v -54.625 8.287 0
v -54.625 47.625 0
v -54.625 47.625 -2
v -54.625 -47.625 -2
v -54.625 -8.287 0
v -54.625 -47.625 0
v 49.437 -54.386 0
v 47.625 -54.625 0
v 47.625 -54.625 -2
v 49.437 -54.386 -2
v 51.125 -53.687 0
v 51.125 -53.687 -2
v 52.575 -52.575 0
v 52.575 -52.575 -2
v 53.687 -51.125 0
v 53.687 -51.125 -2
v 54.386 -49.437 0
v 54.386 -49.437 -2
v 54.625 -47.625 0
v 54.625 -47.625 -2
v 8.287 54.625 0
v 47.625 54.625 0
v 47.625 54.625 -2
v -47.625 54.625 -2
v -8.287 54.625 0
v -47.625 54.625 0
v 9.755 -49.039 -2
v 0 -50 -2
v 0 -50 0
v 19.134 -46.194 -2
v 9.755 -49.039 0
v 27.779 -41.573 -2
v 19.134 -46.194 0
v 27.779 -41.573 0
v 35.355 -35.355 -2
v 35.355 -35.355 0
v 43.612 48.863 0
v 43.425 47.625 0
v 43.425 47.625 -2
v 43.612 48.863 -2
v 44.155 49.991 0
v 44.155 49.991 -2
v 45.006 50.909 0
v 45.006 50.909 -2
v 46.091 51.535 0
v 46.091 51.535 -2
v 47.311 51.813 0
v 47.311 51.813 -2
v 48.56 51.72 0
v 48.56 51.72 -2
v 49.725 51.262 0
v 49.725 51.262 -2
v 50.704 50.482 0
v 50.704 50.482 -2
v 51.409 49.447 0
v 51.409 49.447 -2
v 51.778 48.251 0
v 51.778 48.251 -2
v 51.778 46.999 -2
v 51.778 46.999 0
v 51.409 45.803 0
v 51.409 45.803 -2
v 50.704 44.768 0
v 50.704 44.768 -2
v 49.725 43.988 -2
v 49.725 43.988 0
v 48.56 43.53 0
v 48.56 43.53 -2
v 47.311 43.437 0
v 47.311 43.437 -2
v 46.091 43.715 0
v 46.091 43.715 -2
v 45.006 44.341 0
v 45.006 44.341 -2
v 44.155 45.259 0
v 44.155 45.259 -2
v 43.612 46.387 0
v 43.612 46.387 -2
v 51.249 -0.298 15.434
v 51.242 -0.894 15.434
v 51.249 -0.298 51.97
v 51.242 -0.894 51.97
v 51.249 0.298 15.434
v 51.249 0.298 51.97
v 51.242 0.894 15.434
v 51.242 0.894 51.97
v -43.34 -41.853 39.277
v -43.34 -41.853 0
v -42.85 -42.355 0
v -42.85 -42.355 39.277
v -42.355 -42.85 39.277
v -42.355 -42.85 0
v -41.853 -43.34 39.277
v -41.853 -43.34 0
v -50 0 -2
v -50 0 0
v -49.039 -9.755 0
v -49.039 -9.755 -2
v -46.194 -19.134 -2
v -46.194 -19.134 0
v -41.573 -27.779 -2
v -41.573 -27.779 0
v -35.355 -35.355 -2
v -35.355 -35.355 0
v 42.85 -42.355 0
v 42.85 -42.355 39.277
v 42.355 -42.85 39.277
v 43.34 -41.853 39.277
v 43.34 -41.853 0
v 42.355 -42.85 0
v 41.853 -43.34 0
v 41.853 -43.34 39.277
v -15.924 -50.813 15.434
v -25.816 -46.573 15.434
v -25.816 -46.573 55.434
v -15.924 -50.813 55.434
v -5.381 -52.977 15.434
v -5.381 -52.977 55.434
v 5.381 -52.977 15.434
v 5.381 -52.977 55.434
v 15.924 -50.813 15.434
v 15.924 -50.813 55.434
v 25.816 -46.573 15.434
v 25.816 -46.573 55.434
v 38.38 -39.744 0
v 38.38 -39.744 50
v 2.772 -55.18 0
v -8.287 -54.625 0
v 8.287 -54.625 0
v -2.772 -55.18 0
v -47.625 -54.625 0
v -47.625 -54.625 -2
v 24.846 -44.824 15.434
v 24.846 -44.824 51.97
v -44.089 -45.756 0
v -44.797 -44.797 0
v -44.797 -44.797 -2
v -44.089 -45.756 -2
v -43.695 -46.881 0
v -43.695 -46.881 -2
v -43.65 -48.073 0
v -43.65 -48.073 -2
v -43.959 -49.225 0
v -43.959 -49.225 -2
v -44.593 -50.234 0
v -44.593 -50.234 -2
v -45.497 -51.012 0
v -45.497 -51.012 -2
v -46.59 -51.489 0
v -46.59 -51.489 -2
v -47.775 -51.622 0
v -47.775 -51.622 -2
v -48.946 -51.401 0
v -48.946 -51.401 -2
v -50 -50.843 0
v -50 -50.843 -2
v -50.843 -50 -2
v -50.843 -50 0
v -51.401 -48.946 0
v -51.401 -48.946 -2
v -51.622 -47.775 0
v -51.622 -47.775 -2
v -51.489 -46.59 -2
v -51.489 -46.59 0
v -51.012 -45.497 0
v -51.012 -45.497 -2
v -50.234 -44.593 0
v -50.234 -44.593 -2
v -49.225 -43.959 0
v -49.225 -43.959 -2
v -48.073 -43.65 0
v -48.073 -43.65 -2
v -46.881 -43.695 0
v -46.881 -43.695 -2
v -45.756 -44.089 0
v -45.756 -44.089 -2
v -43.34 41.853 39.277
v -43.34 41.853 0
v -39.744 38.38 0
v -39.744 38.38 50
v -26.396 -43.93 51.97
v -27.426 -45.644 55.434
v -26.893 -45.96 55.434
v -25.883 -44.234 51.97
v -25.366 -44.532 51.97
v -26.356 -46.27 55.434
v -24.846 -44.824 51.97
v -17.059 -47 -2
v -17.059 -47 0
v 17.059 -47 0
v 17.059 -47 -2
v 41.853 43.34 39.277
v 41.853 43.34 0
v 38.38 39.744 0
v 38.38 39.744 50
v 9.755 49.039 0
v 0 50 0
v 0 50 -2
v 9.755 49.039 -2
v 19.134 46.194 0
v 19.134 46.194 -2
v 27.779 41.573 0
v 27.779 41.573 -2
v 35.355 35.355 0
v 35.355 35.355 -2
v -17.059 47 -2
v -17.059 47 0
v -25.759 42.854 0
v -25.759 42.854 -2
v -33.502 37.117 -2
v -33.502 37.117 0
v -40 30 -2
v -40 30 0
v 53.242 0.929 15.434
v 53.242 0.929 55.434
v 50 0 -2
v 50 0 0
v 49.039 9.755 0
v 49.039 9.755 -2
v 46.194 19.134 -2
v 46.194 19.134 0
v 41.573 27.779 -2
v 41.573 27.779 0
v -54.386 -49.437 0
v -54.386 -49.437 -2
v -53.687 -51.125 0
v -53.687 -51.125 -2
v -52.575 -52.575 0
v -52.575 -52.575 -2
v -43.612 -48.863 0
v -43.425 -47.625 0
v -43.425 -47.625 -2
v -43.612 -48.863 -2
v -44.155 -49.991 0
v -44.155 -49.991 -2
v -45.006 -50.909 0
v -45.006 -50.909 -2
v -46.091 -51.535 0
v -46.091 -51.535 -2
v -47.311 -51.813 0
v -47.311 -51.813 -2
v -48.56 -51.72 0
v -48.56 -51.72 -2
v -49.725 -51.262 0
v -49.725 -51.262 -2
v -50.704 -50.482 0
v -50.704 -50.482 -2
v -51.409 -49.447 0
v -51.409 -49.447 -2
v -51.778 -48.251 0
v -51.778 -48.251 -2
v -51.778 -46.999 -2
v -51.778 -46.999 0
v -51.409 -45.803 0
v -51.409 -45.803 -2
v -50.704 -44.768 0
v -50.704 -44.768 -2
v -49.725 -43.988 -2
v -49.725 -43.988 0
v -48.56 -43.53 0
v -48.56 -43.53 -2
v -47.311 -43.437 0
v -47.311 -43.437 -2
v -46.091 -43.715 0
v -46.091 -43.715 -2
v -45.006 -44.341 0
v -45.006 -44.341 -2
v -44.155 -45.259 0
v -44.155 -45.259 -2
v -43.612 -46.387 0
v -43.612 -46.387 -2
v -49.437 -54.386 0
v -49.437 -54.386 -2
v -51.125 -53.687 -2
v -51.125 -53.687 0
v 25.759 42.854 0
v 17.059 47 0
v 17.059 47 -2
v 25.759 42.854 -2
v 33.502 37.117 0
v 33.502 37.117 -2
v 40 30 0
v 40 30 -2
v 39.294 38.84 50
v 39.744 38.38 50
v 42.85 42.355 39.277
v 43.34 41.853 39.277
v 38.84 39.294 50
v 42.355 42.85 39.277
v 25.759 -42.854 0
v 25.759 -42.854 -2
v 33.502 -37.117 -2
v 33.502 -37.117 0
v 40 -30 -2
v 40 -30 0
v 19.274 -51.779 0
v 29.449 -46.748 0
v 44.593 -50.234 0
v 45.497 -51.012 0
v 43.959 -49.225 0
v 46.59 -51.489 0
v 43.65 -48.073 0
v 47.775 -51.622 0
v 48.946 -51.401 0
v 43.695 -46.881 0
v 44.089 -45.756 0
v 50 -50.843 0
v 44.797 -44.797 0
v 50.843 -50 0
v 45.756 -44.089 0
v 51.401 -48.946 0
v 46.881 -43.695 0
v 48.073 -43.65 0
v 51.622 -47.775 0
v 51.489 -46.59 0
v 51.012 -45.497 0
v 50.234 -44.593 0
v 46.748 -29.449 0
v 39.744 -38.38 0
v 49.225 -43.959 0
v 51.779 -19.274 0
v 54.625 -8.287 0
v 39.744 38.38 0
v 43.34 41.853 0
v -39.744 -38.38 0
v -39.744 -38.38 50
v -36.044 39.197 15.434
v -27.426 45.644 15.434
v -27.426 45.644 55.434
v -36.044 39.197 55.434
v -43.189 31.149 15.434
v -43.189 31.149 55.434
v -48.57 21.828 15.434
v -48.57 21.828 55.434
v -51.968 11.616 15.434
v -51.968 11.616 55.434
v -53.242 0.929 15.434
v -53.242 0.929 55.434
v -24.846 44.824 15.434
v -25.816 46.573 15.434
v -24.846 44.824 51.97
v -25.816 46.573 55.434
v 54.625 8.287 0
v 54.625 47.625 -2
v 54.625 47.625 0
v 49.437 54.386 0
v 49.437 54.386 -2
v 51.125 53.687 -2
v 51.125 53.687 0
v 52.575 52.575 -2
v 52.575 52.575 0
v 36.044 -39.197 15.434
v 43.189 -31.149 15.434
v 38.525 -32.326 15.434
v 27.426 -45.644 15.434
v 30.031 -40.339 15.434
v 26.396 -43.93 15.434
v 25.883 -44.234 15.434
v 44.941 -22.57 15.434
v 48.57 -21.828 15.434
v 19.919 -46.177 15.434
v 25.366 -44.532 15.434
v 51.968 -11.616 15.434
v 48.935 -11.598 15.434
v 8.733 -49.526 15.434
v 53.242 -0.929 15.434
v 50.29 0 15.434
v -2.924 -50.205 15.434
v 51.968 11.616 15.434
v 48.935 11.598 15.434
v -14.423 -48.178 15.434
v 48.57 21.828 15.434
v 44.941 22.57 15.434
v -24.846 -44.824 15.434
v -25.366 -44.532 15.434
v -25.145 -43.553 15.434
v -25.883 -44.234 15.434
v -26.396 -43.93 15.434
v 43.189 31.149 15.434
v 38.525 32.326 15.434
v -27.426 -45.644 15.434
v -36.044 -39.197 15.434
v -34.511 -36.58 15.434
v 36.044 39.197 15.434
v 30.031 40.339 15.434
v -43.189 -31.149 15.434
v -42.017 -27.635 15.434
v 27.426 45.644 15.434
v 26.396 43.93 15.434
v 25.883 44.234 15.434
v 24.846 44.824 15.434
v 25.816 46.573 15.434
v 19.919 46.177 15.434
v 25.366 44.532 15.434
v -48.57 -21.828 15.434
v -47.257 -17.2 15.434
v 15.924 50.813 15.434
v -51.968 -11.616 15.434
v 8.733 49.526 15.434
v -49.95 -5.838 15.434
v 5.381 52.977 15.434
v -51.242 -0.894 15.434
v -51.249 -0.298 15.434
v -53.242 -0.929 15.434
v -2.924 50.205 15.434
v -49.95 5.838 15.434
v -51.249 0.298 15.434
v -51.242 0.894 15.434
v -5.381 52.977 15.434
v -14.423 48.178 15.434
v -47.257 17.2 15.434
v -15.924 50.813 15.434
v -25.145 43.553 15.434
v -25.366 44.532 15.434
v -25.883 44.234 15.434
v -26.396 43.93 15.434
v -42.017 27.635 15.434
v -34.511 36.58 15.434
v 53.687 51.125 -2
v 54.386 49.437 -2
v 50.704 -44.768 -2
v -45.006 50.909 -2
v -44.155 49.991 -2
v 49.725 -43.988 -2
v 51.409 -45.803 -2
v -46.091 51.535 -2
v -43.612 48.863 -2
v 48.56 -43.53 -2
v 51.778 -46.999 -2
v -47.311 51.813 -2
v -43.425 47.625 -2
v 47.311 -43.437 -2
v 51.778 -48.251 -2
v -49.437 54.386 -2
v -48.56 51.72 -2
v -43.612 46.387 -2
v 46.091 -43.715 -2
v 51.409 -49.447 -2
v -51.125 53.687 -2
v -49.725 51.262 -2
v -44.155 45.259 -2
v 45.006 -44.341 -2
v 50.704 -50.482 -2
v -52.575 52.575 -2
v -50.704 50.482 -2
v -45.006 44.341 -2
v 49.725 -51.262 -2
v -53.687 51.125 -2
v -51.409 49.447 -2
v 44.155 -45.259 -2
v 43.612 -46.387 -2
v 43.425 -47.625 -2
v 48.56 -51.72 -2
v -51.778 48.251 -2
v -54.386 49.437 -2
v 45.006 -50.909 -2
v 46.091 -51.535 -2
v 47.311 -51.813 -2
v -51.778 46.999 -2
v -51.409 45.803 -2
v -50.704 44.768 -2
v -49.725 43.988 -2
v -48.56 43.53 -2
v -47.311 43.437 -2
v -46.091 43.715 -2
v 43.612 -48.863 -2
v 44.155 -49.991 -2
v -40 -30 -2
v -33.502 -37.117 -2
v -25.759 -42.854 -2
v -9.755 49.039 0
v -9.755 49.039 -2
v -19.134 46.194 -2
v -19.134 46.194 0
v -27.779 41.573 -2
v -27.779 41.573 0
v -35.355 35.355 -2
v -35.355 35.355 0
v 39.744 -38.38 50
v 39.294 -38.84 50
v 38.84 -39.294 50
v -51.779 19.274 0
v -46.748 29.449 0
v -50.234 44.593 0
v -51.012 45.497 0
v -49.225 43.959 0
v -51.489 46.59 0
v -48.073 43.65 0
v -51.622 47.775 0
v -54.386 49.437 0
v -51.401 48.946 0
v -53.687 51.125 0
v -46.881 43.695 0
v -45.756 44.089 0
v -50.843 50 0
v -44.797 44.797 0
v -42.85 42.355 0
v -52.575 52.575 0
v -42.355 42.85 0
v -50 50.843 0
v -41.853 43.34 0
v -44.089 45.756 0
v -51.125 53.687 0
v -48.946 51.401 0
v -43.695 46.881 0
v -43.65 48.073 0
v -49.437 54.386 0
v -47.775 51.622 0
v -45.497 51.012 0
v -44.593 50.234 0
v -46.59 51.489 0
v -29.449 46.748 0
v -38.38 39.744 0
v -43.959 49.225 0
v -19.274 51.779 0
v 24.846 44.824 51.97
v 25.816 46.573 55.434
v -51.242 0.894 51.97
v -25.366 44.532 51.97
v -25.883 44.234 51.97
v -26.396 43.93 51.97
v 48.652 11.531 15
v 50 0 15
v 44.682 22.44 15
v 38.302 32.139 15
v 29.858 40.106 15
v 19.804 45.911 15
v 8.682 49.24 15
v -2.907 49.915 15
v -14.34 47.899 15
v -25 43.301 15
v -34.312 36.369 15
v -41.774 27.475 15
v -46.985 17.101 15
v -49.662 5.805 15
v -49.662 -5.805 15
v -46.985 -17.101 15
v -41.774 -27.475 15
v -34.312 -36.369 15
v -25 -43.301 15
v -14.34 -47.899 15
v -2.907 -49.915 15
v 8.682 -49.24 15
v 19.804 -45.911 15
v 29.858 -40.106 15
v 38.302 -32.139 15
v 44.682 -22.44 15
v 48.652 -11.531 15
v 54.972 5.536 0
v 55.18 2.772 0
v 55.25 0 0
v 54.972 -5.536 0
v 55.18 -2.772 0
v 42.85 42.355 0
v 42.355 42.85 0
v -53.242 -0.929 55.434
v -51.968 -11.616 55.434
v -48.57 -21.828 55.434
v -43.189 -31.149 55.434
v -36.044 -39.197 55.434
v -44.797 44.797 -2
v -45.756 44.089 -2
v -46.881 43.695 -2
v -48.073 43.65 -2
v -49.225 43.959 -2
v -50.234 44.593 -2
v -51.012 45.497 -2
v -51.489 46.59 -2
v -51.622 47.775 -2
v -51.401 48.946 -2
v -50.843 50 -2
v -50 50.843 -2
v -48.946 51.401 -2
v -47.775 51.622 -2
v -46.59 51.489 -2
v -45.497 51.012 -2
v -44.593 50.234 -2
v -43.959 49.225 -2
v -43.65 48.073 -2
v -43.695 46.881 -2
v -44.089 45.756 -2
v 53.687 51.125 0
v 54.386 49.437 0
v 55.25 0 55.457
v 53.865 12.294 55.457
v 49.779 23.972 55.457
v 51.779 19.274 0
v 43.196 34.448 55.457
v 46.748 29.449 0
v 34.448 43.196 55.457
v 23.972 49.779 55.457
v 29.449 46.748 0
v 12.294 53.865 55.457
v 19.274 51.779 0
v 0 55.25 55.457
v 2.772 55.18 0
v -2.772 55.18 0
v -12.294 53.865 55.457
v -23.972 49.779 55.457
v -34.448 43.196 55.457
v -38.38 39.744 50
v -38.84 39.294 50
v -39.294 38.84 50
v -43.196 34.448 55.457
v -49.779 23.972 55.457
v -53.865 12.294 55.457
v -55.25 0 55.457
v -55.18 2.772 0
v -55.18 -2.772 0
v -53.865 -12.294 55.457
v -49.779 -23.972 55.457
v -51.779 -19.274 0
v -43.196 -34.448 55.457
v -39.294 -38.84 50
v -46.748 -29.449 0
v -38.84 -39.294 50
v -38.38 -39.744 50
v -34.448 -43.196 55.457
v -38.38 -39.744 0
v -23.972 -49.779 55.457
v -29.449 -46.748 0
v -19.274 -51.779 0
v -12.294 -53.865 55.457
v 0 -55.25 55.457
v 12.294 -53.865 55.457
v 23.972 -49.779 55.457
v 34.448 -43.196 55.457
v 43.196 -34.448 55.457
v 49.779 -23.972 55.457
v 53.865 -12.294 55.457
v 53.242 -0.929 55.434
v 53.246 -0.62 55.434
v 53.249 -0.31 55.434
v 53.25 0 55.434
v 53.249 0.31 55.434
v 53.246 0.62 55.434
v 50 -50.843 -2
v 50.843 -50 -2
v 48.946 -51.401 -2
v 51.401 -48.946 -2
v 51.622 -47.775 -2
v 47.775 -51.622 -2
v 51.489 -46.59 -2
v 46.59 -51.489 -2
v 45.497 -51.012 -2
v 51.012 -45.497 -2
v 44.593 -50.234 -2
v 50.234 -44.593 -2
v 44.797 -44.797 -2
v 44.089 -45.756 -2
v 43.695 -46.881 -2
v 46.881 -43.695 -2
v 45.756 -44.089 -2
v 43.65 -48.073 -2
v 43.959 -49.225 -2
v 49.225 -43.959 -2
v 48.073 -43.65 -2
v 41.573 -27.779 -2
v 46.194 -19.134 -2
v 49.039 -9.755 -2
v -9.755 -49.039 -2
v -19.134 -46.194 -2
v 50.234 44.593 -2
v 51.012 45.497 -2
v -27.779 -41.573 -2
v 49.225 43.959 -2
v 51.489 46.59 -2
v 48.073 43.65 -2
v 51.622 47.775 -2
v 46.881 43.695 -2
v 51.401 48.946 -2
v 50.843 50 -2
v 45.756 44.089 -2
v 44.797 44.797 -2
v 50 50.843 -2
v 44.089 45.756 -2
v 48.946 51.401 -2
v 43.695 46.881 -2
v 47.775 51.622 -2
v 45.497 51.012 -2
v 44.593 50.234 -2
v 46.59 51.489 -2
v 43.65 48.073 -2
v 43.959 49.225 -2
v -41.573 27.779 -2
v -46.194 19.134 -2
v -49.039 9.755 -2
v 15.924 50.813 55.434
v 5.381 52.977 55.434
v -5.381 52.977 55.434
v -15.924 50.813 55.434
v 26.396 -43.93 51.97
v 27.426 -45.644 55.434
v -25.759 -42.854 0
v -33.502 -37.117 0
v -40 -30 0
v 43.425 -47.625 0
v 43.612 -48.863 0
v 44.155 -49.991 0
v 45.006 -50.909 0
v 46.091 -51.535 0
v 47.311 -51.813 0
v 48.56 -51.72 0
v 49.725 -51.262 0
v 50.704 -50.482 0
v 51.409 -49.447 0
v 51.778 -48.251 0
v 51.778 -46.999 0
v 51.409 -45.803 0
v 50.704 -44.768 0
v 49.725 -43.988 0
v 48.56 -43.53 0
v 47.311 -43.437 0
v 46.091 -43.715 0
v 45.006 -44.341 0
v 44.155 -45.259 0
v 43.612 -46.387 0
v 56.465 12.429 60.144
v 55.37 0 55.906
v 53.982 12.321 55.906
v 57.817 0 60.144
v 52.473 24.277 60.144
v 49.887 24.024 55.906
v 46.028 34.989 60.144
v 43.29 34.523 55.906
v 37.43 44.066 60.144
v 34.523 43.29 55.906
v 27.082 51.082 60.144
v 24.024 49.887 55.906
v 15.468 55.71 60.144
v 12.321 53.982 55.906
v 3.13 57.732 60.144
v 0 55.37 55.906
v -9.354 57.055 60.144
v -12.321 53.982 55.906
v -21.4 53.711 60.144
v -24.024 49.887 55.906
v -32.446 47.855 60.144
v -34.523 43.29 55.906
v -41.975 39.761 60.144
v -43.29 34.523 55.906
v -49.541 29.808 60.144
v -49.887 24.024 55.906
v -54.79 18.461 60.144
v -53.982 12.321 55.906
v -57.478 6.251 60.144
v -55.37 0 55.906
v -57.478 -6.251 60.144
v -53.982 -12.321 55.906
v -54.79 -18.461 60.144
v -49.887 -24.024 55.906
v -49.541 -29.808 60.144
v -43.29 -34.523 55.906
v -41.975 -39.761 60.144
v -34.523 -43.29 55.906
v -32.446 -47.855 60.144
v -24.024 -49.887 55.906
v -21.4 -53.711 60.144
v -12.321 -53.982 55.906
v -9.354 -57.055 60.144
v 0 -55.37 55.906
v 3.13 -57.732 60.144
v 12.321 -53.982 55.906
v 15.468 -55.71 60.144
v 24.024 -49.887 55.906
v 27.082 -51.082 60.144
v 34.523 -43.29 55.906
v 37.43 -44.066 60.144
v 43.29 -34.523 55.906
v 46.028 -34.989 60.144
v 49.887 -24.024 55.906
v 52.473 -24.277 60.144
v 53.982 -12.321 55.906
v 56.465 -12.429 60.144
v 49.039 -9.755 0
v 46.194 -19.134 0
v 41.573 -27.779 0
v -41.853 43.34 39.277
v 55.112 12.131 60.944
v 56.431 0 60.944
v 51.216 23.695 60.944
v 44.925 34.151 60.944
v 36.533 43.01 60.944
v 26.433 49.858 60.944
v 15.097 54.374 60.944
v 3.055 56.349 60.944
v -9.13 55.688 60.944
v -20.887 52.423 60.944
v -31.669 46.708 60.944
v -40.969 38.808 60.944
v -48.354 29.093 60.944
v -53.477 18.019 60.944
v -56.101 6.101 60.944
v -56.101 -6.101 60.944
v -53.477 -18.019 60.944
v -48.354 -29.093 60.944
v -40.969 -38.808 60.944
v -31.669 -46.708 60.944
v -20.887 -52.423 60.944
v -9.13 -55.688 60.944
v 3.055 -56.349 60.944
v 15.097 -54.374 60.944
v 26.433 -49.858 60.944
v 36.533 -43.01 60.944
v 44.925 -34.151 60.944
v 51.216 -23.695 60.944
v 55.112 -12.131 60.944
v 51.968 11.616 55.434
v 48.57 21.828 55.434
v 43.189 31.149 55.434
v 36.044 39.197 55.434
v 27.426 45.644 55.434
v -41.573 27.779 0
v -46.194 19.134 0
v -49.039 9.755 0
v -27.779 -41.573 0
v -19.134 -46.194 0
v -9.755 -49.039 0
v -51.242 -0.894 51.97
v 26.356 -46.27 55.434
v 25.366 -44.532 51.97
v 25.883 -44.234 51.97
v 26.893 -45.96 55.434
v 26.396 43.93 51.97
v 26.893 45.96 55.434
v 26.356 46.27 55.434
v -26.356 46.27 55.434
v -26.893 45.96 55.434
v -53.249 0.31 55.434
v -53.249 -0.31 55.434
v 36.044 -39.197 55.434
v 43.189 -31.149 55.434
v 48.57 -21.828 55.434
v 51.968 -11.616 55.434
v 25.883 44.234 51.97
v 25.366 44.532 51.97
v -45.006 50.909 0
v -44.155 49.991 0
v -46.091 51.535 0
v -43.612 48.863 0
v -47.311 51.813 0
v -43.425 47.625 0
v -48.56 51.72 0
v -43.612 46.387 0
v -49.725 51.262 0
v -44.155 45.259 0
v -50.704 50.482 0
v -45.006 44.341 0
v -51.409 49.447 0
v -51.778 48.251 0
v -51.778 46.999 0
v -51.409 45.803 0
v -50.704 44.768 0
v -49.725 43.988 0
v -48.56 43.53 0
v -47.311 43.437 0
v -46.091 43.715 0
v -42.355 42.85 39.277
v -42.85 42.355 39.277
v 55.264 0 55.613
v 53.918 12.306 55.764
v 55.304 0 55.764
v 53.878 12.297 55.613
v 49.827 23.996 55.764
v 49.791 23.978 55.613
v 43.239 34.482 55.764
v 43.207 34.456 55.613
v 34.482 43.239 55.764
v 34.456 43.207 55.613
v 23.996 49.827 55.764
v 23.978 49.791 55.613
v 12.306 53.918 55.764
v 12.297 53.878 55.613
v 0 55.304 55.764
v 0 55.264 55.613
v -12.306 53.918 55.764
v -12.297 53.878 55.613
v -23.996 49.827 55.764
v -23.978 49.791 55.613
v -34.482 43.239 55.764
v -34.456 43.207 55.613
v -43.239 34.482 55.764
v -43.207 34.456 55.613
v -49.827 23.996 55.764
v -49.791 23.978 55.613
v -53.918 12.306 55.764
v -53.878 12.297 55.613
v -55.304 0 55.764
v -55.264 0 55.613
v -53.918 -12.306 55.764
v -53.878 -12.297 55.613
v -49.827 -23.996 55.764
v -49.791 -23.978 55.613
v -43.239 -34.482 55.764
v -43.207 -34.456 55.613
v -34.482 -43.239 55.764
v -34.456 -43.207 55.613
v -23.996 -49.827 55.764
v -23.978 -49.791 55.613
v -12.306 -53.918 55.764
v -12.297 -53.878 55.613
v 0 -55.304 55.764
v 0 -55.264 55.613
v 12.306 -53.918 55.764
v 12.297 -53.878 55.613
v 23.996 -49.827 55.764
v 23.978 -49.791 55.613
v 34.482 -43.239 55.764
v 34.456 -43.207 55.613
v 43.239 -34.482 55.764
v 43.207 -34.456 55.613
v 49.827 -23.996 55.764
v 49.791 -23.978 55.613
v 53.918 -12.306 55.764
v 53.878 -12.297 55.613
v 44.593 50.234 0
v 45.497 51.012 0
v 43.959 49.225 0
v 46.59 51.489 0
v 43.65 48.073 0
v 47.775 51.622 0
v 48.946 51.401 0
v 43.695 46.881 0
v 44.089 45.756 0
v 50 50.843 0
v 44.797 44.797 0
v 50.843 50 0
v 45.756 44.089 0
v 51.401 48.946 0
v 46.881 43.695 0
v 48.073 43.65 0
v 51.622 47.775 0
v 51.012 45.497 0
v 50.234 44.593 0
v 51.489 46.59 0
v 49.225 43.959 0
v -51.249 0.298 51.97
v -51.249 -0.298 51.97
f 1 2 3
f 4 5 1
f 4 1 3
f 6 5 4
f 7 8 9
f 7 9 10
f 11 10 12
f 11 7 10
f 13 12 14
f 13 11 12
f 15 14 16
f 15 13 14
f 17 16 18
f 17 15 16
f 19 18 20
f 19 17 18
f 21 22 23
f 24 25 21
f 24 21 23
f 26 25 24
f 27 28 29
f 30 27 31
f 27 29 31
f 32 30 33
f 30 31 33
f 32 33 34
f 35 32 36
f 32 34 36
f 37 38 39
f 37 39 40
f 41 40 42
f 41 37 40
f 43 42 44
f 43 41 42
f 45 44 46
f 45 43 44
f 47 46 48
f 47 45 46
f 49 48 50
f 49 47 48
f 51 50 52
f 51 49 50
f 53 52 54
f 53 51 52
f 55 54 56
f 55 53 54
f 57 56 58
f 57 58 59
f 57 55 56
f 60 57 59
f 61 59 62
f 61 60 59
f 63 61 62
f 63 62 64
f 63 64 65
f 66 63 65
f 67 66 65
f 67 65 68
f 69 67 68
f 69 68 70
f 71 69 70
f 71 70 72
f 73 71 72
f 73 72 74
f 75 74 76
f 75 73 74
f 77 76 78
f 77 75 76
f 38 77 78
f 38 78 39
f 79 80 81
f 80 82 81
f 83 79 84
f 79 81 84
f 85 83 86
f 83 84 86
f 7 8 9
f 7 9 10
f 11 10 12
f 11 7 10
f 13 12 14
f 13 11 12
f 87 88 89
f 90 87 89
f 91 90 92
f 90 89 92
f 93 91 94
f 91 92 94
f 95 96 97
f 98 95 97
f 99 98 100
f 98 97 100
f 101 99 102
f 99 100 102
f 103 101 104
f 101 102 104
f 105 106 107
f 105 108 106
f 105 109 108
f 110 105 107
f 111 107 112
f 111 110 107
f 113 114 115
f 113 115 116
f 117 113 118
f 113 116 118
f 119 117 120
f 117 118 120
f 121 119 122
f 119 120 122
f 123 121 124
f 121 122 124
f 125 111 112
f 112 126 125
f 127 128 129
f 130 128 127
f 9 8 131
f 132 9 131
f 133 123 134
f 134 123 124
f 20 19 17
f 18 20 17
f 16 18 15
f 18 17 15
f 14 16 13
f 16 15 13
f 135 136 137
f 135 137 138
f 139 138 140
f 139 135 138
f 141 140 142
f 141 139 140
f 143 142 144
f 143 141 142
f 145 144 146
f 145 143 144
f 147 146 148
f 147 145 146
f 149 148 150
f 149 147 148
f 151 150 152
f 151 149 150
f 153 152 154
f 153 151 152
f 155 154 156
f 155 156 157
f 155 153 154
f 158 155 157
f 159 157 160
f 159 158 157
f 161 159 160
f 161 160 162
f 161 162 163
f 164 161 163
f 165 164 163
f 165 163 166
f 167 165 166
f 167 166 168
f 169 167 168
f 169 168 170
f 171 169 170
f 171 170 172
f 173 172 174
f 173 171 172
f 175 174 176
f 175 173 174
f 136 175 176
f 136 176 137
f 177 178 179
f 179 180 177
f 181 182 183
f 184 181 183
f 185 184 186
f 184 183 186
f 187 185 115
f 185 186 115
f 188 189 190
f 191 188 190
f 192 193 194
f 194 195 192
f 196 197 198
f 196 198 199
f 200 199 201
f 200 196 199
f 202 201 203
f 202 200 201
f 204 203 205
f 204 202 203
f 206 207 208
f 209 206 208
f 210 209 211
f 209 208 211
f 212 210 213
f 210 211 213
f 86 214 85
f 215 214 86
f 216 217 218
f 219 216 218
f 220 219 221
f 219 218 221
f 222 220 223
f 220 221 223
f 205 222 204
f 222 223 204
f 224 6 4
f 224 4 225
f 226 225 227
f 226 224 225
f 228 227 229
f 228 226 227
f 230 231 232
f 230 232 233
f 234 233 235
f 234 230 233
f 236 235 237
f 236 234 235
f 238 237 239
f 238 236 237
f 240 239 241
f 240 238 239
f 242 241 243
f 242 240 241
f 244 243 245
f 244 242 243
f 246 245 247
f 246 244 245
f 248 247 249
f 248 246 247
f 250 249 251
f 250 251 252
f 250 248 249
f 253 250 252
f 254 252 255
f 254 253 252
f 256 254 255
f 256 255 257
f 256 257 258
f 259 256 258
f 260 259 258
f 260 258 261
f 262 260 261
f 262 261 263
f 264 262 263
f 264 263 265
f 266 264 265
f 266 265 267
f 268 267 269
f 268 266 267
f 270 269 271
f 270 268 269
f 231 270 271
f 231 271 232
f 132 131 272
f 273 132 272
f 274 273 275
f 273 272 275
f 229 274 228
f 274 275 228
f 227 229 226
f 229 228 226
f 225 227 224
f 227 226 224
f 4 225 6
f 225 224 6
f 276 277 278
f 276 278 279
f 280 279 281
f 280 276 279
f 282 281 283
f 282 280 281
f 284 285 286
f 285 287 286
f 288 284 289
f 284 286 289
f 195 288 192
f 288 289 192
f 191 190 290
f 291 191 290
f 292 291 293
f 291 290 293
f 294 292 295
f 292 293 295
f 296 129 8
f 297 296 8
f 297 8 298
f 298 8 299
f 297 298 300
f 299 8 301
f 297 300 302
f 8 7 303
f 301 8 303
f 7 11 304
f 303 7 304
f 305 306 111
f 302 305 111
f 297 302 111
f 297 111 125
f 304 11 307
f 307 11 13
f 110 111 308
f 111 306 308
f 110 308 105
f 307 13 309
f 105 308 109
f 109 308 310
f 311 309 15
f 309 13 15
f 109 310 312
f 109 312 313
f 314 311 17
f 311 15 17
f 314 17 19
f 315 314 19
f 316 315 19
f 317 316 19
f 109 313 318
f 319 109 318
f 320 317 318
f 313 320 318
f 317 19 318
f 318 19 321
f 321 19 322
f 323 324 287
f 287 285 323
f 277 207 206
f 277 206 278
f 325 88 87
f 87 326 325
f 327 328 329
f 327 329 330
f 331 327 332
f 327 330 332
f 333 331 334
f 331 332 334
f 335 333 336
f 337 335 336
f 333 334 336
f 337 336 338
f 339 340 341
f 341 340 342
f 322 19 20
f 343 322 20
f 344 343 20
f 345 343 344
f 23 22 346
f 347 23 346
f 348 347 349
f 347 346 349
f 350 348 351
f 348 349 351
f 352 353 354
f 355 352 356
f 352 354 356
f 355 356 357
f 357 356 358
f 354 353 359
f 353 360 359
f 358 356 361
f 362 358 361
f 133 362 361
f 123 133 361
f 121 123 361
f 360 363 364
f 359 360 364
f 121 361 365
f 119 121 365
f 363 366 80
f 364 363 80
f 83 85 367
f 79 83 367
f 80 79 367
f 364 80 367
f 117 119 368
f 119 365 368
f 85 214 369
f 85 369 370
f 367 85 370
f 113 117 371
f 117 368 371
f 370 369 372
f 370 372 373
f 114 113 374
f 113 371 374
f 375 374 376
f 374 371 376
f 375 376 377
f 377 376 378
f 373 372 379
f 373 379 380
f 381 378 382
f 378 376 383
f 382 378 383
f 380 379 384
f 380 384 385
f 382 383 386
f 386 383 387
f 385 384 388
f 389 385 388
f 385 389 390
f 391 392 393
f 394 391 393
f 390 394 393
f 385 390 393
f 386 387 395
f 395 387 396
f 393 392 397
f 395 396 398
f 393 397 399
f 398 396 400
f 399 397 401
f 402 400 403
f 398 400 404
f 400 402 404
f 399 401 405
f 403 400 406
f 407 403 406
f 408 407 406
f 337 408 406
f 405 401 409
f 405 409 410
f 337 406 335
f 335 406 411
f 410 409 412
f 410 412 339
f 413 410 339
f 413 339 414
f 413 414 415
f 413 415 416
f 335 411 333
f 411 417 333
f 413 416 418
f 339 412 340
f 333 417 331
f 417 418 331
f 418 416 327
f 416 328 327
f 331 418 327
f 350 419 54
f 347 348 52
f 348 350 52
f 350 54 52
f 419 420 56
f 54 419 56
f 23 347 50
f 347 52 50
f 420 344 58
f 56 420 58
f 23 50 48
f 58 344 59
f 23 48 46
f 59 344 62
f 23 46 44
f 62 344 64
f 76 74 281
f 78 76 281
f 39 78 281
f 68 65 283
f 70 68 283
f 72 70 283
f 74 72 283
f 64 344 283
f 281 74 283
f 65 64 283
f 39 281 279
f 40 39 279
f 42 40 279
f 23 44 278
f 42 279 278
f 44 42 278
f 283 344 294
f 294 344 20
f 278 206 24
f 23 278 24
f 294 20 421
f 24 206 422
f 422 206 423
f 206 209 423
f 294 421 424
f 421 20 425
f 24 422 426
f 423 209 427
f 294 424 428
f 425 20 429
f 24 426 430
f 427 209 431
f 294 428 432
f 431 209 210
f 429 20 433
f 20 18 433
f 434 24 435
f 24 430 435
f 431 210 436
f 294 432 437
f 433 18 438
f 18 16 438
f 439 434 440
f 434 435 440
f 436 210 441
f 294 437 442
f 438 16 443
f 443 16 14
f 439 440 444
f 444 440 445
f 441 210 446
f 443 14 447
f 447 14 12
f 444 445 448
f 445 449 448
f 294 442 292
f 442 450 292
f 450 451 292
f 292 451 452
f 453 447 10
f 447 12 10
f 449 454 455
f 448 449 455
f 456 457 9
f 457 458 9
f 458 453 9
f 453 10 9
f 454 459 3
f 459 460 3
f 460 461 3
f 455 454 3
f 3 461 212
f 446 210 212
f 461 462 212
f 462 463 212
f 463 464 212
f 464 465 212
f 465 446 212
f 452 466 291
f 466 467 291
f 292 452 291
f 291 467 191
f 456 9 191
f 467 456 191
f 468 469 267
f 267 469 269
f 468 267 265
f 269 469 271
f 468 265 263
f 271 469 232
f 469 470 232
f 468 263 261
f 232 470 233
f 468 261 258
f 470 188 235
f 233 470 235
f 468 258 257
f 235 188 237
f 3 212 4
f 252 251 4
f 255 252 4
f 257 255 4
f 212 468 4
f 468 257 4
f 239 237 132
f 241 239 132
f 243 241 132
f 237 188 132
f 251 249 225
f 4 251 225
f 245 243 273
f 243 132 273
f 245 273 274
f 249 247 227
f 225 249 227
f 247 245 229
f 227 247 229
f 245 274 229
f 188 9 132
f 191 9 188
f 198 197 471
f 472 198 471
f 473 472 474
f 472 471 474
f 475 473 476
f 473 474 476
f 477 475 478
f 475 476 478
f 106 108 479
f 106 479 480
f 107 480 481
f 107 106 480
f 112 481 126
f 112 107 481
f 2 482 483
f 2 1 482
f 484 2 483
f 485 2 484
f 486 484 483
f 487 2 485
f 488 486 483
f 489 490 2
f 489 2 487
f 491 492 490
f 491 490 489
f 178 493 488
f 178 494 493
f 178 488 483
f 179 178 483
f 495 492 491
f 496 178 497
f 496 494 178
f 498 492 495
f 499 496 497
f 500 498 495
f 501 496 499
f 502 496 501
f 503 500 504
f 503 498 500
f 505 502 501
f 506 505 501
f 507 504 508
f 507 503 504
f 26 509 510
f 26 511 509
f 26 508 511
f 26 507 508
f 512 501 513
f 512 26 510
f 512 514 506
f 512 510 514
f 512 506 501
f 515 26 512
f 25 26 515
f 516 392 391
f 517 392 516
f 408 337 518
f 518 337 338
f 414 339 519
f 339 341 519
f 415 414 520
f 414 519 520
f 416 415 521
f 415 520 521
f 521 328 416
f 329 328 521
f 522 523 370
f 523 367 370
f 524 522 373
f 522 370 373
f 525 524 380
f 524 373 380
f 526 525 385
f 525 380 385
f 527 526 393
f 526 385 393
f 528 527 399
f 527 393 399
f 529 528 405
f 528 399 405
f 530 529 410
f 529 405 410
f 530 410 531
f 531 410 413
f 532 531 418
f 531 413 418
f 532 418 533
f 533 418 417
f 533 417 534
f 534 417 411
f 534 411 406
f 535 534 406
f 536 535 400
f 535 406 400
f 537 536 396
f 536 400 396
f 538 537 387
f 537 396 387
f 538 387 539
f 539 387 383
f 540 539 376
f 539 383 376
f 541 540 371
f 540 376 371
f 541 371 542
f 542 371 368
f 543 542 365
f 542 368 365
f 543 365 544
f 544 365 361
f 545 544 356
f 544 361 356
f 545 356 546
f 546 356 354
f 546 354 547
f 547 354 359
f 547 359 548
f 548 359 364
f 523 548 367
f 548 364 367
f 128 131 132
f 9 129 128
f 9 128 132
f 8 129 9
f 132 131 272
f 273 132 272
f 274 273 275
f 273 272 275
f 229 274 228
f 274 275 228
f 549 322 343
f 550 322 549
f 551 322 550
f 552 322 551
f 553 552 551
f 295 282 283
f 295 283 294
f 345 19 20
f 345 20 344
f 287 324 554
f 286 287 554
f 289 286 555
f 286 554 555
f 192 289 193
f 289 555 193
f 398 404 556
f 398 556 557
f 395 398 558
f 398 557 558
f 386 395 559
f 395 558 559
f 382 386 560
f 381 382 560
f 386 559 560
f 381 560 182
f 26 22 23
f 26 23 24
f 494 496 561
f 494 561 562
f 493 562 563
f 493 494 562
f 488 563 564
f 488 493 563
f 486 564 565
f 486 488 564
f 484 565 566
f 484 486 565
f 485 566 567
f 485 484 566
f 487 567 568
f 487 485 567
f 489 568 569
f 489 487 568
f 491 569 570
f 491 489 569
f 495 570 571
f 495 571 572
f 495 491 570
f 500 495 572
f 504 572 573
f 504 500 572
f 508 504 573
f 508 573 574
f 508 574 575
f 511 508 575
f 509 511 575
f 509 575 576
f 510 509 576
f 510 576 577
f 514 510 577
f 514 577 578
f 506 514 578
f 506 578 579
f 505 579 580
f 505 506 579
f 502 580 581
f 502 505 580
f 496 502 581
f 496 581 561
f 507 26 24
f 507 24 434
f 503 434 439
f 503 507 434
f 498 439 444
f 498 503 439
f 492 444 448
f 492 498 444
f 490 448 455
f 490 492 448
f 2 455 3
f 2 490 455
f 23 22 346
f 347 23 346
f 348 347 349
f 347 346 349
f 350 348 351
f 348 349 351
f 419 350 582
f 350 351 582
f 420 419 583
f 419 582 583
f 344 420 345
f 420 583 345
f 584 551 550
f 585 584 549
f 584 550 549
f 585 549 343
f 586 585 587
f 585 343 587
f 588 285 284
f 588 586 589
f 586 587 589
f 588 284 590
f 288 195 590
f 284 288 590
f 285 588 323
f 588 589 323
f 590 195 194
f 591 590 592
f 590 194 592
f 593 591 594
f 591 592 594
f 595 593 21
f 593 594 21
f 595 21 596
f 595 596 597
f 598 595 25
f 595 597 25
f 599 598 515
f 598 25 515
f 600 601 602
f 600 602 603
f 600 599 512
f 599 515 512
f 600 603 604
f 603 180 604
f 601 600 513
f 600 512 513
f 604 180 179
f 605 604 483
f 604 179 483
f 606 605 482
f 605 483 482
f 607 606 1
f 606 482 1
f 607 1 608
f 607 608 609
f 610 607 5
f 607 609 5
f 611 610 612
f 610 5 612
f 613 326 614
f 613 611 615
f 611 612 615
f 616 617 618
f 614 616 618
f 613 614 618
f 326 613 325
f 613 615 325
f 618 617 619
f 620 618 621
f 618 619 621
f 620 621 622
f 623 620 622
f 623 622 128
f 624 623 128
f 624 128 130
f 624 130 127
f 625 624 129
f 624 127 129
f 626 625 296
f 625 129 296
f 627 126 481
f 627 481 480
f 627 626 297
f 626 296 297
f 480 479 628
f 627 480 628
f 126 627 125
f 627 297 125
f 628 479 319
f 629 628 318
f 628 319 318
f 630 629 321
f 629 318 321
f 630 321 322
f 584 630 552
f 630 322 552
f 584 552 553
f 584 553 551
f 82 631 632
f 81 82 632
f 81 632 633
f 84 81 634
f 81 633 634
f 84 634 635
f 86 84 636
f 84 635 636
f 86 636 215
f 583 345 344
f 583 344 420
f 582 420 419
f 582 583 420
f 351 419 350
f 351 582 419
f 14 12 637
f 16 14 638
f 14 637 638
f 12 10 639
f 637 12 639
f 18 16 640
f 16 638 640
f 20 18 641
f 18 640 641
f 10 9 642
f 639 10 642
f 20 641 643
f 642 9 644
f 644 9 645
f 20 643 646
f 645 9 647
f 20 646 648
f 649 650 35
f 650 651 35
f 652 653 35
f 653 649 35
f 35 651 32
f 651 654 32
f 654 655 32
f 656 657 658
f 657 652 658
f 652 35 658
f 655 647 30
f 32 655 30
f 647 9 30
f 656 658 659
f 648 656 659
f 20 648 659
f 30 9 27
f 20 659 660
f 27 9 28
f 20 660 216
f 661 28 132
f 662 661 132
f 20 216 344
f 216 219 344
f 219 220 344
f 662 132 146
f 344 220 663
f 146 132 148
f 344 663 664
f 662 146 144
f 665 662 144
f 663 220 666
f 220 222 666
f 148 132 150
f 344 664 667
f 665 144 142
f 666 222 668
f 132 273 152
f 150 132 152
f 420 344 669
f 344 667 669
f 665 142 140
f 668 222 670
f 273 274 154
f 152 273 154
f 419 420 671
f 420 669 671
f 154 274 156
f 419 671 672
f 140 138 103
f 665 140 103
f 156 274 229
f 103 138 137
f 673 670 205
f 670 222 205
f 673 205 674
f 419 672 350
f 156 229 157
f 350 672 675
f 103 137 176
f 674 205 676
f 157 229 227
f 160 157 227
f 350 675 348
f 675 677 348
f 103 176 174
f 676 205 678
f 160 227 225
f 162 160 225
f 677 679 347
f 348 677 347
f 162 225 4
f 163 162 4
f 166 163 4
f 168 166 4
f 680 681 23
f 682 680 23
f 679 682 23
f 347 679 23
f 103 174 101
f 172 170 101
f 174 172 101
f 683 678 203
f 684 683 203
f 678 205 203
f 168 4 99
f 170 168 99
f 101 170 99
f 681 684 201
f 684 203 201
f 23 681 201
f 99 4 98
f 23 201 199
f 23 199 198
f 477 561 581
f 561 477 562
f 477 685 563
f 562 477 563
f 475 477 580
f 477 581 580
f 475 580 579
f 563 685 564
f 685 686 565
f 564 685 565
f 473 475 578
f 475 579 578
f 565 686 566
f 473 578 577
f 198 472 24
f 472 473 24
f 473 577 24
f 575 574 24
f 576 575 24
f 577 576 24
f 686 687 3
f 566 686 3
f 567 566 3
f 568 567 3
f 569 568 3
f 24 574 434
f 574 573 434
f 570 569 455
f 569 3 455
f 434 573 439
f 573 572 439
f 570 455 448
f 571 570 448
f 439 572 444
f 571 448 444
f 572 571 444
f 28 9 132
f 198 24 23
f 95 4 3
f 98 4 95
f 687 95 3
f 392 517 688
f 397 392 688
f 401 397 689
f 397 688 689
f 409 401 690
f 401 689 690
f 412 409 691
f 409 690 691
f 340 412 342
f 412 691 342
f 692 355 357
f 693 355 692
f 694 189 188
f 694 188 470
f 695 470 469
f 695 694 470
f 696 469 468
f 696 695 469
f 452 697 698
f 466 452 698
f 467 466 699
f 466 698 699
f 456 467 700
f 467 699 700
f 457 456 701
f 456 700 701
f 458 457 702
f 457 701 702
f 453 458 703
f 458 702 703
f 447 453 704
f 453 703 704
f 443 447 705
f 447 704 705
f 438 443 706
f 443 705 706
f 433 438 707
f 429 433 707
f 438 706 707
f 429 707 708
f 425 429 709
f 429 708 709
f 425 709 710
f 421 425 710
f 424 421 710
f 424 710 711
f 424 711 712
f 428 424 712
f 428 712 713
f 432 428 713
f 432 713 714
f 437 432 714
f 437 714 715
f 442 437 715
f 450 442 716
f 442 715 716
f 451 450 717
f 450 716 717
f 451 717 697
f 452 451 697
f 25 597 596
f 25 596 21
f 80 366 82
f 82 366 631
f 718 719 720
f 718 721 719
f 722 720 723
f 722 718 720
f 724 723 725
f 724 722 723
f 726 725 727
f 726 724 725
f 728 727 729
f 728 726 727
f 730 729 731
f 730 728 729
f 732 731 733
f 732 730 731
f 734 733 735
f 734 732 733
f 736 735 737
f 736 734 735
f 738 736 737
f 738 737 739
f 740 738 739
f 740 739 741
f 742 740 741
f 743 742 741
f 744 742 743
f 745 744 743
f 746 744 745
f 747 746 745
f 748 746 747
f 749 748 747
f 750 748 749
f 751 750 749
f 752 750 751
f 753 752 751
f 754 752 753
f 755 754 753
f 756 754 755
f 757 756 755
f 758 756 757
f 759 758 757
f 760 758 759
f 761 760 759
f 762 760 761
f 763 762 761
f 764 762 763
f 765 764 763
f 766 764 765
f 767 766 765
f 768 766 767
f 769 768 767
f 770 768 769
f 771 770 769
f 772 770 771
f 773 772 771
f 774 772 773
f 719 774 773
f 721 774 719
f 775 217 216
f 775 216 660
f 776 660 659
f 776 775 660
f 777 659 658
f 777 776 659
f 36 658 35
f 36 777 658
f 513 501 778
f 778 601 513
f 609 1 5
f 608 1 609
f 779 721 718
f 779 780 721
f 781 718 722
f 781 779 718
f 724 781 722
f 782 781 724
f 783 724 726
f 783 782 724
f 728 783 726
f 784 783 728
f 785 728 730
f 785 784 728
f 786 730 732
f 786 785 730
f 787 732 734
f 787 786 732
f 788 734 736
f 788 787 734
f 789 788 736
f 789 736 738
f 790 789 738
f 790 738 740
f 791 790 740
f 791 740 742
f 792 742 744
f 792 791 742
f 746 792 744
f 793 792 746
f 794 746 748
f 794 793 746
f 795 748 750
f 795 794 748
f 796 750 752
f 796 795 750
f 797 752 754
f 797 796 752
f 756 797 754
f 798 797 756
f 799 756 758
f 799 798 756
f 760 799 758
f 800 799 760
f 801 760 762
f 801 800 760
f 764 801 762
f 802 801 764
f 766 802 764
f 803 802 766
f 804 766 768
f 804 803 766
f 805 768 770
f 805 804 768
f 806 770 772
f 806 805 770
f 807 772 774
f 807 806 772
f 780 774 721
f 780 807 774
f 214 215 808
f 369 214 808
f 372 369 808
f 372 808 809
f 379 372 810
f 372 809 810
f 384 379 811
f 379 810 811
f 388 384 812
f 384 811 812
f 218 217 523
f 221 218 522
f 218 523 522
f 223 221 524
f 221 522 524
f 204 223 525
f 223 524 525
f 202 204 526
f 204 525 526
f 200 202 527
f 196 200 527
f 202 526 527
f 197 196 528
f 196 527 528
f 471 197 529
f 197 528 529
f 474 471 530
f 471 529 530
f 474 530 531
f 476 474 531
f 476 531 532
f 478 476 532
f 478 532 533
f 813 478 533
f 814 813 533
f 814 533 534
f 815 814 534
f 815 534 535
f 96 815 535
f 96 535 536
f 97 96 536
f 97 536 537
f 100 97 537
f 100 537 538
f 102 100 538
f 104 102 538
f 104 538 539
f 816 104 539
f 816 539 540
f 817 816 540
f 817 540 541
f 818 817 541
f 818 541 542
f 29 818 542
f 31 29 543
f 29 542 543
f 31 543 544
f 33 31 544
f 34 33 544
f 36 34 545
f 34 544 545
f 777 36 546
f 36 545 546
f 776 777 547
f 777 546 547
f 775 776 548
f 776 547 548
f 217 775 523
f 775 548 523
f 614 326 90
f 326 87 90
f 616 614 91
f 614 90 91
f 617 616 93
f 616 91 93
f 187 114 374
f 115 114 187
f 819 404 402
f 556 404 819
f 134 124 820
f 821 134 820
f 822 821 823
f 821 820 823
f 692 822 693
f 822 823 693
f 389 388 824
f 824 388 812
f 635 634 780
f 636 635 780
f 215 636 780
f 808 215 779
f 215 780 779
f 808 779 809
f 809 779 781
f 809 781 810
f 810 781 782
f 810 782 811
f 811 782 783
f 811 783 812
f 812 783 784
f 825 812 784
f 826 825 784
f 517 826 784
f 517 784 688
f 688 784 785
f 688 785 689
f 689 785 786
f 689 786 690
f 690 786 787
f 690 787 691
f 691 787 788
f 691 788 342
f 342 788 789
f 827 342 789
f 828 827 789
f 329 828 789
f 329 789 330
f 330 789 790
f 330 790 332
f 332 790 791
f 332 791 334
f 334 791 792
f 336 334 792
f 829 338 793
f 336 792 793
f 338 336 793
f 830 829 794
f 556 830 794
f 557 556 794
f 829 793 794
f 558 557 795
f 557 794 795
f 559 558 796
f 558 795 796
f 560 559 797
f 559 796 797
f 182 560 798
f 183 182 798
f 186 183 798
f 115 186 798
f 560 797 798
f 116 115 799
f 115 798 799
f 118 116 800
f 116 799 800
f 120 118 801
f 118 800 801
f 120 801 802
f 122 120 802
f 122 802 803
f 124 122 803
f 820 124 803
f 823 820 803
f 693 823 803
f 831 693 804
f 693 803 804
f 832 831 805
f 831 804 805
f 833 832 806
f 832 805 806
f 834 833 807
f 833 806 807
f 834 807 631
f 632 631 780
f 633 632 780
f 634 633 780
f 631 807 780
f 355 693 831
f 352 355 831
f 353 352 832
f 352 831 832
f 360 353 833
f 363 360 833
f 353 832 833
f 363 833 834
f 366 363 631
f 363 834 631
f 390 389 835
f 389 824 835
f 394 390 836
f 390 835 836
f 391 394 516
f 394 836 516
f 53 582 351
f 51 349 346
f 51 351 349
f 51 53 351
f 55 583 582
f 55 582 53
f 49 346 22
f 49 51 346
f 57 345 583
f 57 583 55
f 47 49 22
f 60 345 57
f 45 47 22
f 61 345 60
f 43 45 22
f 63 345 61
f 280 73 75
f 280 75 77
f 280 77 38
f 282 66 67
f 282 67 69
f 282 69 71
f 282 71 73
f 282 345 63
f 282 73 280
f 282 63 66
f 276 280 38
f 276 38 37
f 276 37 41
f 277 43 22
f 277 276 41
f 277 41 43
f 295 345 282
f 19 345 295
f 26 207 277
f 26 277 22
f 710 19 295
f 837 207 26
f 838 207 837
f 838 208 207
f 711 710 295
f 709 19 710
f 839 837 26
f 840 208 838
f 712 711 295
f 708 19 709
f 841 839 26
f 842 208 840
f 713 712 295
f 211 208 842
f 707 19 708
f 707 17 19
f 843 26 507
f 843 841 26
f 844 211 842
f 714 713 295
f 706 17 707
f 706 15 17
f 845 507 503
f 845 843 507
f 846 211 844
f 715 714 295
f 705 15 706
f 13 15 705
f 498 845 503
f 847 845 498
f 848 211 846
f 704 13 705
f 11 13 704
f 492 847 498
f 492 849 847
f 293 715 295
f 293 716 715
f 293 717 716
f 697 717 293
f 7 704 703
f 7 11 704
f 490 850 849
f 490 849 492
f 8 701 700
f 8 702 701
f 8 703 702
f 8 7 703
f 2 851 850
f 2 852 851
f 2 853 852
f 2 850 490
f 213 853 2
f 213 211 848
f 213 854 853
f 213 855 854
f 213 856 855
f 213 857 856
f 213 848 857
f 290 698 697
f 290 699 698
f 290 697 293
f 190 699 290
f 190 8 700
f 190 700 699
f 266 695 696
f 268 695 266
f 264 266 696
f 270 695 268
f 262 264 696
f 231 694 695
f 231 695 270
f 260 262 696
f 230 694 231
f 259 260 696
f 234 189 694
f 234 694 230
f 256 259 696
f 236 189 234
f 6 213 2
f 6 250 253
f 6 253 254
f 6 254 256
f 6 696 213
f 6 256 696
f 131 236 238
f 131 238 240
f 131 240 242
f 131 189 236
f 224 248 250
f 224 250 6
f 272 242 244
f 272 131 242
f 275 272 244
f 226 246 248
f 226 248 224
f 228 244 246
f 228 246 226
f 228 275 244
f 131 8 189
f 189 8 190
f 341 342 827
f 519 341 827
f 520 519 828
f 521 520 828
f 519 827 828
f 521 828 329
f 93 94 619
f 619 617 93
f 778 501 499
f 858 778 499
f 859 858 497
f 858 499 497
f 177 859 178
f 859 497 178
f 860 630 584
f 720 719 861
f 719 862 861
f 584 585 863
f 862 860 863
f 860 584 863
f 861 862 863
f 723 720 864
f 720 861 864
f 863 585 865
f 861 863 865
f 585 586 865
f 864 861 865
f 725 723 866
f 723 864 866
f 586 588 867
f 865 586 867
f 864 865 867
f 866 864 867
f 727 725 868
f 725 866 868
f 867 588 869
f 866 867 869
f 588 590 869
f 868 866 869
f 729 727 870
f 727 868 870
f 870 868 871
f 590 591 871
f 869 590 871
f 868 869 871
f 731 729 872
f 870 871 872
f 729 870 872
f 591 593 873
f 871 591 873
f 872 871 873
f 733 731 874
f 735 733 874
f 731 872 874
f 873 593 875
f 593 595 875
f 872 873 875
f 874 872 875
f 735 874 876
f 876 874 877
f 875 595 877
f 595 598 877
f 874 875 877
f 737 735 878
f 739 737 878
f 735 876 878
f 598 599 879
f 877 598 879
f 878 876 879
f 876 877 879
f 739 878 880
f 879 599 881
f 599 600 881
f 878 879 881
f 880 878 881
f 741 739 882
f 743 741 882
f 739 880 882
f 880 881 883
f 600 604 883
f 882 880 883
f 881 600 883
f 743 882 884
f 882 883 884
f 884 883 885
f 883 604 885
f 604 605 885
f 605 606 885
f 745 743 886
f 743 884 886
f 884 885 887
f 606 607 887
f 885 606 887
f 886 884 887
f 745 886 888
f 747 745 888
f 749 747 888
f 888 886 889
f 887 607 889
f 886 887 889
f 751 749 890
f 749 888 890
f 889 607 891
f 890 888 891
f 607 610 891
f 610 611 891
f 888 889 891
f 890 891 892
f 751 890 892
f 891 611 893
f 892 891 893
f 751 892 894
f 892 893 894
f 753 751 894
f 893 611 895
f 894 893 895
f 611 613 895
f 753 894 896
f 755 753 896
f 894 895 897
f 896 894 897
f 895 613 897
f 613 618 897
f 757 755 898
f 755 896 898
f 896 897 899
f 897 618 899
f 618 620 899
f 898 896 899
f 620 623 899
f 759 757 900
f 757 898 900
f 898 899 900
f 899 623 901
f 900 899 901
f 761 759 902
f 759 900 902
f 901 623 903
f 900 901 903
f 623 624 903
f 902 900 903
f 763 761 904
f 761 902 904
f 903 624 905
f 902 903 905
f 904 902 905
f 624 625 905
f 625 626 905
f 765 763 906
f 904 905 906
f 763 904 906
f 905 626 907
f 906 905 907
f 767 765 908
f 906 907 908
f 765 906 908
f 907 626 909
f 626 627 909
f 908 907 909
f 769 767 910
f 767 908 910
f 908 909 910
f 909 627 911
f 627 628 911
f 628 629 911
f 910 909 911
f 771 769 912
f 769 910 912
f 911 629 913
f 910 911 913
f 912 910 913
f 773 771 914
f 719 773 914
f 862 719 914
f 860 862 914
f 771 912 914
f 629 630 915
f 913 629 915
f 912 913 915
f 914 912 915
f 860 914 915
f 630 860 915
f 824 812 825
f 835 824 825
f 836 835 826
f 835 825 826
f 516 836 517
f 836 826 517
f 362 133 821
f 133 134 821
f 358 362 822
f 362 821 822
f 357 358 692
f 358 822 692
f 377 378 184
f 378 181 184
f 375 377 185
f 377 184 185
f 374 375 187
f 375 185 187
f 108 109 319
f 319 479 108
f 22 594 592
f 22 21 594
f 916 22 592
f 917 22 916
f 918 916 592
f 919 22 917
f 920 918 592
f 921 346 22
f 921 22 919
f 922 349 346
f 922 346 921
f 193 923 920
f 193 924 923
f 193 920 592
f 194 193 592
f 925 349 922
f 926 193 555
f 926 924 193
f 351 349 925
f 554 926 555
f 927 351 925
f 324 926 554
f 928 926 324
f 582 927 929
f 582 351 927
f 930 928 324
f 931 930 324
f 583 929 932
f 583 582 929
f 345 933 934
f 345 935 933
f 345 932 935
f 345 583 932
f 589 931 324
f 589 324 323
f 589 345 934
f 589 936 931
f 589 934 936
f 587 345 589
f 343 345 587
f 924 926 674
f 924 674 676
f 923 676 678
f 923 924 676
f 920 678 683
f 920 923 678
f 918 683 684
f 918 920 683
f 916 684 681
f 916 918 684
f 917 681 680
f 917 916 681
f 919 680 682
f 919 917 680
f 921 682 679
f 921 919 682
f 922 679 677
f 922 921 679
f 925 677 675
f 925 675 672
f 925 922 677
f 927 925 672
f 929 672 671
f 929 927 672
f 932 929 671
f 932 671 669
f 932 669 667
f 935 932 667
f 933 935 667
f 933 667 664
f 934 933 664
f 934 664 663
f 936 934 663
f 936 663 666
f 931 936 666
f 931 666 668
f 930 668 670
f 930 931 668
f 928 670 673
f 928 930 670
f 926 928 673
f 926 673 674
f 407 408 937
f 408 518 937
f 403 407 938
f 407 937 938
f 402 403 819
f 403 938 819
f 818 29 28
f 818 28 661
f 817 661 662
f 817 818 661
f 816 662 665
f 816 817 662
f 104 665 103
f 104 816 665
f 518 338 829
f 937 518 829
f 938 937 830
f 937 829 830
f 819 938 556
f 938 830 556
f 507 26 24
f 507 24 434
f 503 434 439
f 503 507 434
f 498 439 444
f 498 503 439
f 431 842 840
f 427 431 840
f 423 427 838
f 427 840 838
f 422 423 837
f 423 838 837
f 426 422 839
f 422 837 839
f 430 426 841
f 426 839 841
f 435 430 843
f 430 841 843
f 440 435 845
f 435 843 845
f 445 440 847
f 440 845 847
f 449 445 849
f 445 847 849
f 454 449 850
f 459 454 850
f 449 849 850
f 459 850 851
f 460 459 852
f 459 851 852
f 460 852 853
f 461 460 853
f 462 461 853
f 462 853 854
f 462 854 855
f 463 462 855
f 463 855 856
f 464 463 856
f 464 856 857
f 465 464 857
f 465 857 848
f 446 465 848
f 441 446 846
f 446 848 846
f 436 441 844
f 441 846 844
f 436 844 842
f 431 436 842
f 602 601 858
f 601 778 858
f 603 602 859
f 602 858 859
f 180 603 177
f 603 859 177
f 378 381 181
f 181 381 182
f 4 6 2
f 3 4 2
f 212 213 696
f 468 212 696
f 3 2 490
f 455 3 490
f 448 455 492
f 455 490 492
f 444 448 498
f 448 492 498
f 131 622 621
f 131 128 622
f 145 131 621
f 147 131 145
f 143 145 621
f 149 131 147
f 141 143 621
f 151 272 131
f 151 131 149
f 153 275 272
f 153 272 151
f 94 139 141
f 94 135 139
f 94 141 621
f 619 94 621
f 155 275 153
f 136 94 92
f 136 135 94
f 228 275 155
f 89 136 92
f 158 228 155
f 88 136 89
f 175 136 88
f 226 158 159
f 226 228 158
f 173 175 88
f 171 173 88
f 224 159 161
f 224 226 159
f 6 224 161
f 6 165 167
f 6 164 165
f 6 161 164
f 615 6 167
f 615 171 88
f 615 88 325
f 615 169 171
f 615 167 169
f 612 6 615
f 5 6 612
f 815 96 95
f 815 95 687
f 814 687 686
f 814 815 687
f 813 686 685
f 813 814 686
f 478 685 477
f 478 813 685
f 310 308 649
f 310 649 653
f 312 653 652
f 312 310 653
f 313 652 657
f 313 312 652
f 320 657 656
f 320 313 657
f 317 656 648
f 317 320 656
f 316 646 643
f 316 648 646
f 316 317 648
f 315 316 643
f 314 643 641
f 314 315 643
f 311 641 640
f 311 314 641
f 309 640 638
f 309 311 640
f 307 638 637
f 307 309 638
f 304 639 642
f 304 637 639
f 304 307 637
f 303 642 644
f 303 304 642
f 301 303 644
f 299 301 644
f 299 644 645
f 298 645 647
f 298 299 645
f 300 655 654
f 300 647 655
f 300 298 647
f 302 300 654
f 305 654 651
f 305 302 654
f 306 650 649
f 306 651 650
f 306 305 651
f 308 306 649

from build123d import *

# Parameters (mm, degrees)
PAD_DEPTH                         = 2
REVOLUTION001_ANGLE               = -1
PAD_MIRRORED_2_DEPTH              = 2
REVOLUTION001_MIRRORED_2_ANGLE    = 1
POLARPATTERN_COUNT                = 4
REVOLUTION002_ANGLE               = -1
REVOLUTION002_MIRRORED001_2_ANGLE = 1
POLARPATTERN001_COUNT             = 6
SKETCH006_R                       = 4.2
PAD001_DEPTH                      = 2
SKETCH006_MIRRORED002_2_R         = 4.2
PAD001_MIRRORED002_2_DEPTH        = 2


with BuildPart() as body:
    # Sketch → Pad (new body)
    with BuildSketch(Plane.XY):
        with BuildLine():
            ThreePointArc((44.796573, 44.796573), (50.453427, 44.796573), (50.453427, 50.453427))
            Line((50.453427, 50.453427), (52.574747, 52.574747))
            ThreePointArc((54.625, 47.625), (54.092157, 50.303784), (52.574747, 52.574747))
            Line((54.625, 47.625), (54.625, 0))
            Line((50, 0), (54.625, 0))
            ThreePointArc((50, 0), (46.193977, 19.134172), (35.355339, 35.355339))
            Line((35.355339, 35.355339), (44.796573, 44.796573))
        make_face()
    pad = extrude(amount=-PAD_DEPTH)

    # Sketch001 → Revolution (revolve)
    with BuildSketch(Plane.XZ):
        with BuildLine():
            Line((50, 0), (50, 15))
            Line((50, 15), (50.290344, 15.43382))
            Line((50.290344, 15.43382), (53.25, 15.43382))
            Line((53.25, 15.43382), (53.25, 55.43382))
            Line((53.25, 55.43382), (56.43138, 60.944132))
            Line((57.817021, 60.144132), (56.43138, 60.944132))
            Line((55.370257, 55.906213), (57.817021, 60.144132))
            ThreePointArc((55.370257, 55.906213), (55.280585, 55.689723), (55.25, 55.457401))
            Line((55.25, 55.457401), (55.25, 0))
            Line((55.25, 0), (50, 0))
        make_face()
    revolve(axis=Axis((0, 0, 0), (0, 0, 1)))

    # Sketch002 (on Face3 of Revolution) → Revolution001 (revolve)
    with BuildSketch(Plane(origin=(0, 0, 0), x_dir=(-0.707107, -0.707107, 0), z_dir=(-0.707107, 0.707107, 0))):
        Polygon((-55.25, 0), (-55.25, 50), (-60.25, 39.277465), (-60.25, 0), align=None)
    revolution001 = revolve(axis=Axis((0, 0, 0), (0, 0, 1)), revolution_arc=REVOLUTION001_ANGLE)

    # Sketch Mirrored 2 → Pad Mirrored 2 (add)
    with BuildSketch(Plane(origin=(0, 0, 0), x_dir=(1, 0, 0), z_dir=(0, 0, -1))):
        with BuildLine():
            ThreePointArc((44.796573, 44.796573), (50.453427, 44.796573), (50.453427, 50.453427))
            Line((50.453427, 50.453427), (52.574747, 52.574747))
            ThreePointArc((54.625, 47.625), (54.092157, 50.303784), (52.574747, 52.574747))
            Line((54.625, 47.625), (54.625, 0))
            Line((50, 0), (54.625, 0))
            ThreePointArc((50, 0), (46.193977, 19.134172), (35.355339, 35.355339))
            Line((35.355339, 35.355339), (44.796573, 44.796573))
        make_face()
    pad_mirrored_2 = extrude(amount=PAD_MIRRORED_2_DEPTH)

    # Sketch002 Mirrored 2 → Revolution001 Mirrored 2 (revolve)
    with BuildSketch(Plane(origin=(0, 0, 0), x_dir=(-0.707107, 0.707107, 0), z_dir=(0.707107, 0.707107, 0))):
        Polygon((-55.25, 0), (-55.25, 50), (-60.25, 39.277465), (-60.25, 0), align=None)
    revolution001_mirrored_2 = revolve(axis=Axis((0, 0, 0), (0, 0, 1)), revolution_arc=REVOLUTION001_MIRRORED_2_ANGLE)

    # PolarPattern: Pad, Revolution001, Pad Mirrored 2, Revolution001 Mirrored 2 ×4 about axis
    polarpattern_axis = Axis((0, 0, 0), (0, 0, 1))
    for i in range(1, POLARPATTERN_COUNT):
        add(pad.rotate(polarpattern_axis, i * 360 / POLARPATTERN_COUNT))
        add(revolution001.rotate(polarpattern_axis, i * 360 / POLARPATTERN_COUNT))
        add(pad_mirrored_2.rotate(polarpattern_axis, i * 360 / POLARPATTERN_COUNT))
        add(revolution001_mirrored_2.rotate(polarpattern_axis, i * 360 / POLARPATTERN_COUNT))

    # Sketch005 → Revolution002 (revolve)
    with BuildSketch(Plane.XZ):
        Polygon((51.25, 15.43382), (51.25, 51.969719), (53.25, 55.43382), (53.25, 15.43382), align=None)
    revolution002 = revolve(axis=Axis((0, 0, 0), (0, 0, 1)), revolution_arc=REVOLUTION002_ANGLE)

    # Sketch005 Mirrored001 2 → Revolution002 Mirrored001 2 (revolve)
    with BuildSketch(Plane.XZ):
        Polygon((51.25, 15.43382), (51.25, 51.969719), (53.25, 55.43382), (53.25, 15.43382), align=None)
    revolution002_mirrored001_2 = revolve(axis=Axis((0, 0, 0), (0, 0, 1)), revolution_arc=REVOLUTION002_MIRRORED001_2_ANGLE)

    # PolarPattern001: Revolution002, Revolution002 Mirrored001 2 ×6 about axis
    polarpattern001_axis = Axis((0, 0, 0), (0, 0, 1))
    for i in range(1, POLARPATTERN001_COUNT):
        add(revolution002.rotate(polarpattern001_axis, i * 360 / POLARPATTERN001_COUNT))
        add(revolution002_mirrored001_2.rotate(polarpattern001_axis, i * 360 / POLARPATTERN001_COUNT))


with BuildPart() as body001:
    # Sketch006 → Pad001 (new body)
    with BuildSketch(Plane.XY):
        with BuildLine():
            Line((-40, 0), (-40, 30))
            ThreePointArc((-17.058722, 47), (-29.768682, 40.172448), (-40, 30))
            Line((0, 47), (-17.058722, 47))
            Line((0, 50), (0, 47))
            Line((0, 50), (0, 54.625))
            Line((-47.624978, 54.625), (0, 54.625))
            ThreePointArc((-47.624978, 54.625), (-52.574748, 52.574747), (-54.625, 47.624978))
            Line((-54.625, 47.624978), (-54.625, 0))
            Line((-54.625, 0), (-50, 0))
            Line((-40, 0), (-50, 0))
        make_face()
        with Locations((-47.625, 47.625)):
            Circle(SKETCH006_R, mode=Mode.SUBTRACT)
    pad001 = extrude(amount=-PAD001_DEPTH)

    # Sketch006 Mirrored002 2 → Pad001 Mirrored002 2 (add)
    with BuildSketch(Plane(origin=(0, 0, 0), x_dir=(-1, 0, 0), z_dir=(0, 0, -1))):
        with BuildLine():
            Line((-40, 0), (-40, 30))
            ThreePointArc((-17.058722, 47), (-29.768682, 40.172448), (-40, 30))
            Line((0, 47), (-17.058722, 47))
            Line((0, 50), (0, 47))
            Line((0, 50), (0, 54.625))
            Line((-47.624978, 54.625), (0, 54.625))
            ThreePointArc((-47.624978, 54.625), (-52.574748, 52.574747), (-54.625, 47.624978))
            Line((-54.625, 47.624978), (-54.625, 0))
            Line((-54.625, 0), (-50, 0))
            Line((-40, 0), (-50, 0))
        make_face()
        with Locations((-47.625, 47.625)):
            Circle(SKETCH006_MIRRORED002_2_R, mode=Mode.SUBTRACT)
    pad001_mirrored002_2 = extrude(amount=PAD001_MIRRORED002_2_DEPTH)

    # Mirrored003: Pad001, Pad001 Mirrored002 2 across Sketch006 H_Axis
    add(pad001.mirror(Plane.ZX))
    add(pad001_mirrored002_2.mirror(Plane.ZX))


solid = Compound([body.part, body001.part])
